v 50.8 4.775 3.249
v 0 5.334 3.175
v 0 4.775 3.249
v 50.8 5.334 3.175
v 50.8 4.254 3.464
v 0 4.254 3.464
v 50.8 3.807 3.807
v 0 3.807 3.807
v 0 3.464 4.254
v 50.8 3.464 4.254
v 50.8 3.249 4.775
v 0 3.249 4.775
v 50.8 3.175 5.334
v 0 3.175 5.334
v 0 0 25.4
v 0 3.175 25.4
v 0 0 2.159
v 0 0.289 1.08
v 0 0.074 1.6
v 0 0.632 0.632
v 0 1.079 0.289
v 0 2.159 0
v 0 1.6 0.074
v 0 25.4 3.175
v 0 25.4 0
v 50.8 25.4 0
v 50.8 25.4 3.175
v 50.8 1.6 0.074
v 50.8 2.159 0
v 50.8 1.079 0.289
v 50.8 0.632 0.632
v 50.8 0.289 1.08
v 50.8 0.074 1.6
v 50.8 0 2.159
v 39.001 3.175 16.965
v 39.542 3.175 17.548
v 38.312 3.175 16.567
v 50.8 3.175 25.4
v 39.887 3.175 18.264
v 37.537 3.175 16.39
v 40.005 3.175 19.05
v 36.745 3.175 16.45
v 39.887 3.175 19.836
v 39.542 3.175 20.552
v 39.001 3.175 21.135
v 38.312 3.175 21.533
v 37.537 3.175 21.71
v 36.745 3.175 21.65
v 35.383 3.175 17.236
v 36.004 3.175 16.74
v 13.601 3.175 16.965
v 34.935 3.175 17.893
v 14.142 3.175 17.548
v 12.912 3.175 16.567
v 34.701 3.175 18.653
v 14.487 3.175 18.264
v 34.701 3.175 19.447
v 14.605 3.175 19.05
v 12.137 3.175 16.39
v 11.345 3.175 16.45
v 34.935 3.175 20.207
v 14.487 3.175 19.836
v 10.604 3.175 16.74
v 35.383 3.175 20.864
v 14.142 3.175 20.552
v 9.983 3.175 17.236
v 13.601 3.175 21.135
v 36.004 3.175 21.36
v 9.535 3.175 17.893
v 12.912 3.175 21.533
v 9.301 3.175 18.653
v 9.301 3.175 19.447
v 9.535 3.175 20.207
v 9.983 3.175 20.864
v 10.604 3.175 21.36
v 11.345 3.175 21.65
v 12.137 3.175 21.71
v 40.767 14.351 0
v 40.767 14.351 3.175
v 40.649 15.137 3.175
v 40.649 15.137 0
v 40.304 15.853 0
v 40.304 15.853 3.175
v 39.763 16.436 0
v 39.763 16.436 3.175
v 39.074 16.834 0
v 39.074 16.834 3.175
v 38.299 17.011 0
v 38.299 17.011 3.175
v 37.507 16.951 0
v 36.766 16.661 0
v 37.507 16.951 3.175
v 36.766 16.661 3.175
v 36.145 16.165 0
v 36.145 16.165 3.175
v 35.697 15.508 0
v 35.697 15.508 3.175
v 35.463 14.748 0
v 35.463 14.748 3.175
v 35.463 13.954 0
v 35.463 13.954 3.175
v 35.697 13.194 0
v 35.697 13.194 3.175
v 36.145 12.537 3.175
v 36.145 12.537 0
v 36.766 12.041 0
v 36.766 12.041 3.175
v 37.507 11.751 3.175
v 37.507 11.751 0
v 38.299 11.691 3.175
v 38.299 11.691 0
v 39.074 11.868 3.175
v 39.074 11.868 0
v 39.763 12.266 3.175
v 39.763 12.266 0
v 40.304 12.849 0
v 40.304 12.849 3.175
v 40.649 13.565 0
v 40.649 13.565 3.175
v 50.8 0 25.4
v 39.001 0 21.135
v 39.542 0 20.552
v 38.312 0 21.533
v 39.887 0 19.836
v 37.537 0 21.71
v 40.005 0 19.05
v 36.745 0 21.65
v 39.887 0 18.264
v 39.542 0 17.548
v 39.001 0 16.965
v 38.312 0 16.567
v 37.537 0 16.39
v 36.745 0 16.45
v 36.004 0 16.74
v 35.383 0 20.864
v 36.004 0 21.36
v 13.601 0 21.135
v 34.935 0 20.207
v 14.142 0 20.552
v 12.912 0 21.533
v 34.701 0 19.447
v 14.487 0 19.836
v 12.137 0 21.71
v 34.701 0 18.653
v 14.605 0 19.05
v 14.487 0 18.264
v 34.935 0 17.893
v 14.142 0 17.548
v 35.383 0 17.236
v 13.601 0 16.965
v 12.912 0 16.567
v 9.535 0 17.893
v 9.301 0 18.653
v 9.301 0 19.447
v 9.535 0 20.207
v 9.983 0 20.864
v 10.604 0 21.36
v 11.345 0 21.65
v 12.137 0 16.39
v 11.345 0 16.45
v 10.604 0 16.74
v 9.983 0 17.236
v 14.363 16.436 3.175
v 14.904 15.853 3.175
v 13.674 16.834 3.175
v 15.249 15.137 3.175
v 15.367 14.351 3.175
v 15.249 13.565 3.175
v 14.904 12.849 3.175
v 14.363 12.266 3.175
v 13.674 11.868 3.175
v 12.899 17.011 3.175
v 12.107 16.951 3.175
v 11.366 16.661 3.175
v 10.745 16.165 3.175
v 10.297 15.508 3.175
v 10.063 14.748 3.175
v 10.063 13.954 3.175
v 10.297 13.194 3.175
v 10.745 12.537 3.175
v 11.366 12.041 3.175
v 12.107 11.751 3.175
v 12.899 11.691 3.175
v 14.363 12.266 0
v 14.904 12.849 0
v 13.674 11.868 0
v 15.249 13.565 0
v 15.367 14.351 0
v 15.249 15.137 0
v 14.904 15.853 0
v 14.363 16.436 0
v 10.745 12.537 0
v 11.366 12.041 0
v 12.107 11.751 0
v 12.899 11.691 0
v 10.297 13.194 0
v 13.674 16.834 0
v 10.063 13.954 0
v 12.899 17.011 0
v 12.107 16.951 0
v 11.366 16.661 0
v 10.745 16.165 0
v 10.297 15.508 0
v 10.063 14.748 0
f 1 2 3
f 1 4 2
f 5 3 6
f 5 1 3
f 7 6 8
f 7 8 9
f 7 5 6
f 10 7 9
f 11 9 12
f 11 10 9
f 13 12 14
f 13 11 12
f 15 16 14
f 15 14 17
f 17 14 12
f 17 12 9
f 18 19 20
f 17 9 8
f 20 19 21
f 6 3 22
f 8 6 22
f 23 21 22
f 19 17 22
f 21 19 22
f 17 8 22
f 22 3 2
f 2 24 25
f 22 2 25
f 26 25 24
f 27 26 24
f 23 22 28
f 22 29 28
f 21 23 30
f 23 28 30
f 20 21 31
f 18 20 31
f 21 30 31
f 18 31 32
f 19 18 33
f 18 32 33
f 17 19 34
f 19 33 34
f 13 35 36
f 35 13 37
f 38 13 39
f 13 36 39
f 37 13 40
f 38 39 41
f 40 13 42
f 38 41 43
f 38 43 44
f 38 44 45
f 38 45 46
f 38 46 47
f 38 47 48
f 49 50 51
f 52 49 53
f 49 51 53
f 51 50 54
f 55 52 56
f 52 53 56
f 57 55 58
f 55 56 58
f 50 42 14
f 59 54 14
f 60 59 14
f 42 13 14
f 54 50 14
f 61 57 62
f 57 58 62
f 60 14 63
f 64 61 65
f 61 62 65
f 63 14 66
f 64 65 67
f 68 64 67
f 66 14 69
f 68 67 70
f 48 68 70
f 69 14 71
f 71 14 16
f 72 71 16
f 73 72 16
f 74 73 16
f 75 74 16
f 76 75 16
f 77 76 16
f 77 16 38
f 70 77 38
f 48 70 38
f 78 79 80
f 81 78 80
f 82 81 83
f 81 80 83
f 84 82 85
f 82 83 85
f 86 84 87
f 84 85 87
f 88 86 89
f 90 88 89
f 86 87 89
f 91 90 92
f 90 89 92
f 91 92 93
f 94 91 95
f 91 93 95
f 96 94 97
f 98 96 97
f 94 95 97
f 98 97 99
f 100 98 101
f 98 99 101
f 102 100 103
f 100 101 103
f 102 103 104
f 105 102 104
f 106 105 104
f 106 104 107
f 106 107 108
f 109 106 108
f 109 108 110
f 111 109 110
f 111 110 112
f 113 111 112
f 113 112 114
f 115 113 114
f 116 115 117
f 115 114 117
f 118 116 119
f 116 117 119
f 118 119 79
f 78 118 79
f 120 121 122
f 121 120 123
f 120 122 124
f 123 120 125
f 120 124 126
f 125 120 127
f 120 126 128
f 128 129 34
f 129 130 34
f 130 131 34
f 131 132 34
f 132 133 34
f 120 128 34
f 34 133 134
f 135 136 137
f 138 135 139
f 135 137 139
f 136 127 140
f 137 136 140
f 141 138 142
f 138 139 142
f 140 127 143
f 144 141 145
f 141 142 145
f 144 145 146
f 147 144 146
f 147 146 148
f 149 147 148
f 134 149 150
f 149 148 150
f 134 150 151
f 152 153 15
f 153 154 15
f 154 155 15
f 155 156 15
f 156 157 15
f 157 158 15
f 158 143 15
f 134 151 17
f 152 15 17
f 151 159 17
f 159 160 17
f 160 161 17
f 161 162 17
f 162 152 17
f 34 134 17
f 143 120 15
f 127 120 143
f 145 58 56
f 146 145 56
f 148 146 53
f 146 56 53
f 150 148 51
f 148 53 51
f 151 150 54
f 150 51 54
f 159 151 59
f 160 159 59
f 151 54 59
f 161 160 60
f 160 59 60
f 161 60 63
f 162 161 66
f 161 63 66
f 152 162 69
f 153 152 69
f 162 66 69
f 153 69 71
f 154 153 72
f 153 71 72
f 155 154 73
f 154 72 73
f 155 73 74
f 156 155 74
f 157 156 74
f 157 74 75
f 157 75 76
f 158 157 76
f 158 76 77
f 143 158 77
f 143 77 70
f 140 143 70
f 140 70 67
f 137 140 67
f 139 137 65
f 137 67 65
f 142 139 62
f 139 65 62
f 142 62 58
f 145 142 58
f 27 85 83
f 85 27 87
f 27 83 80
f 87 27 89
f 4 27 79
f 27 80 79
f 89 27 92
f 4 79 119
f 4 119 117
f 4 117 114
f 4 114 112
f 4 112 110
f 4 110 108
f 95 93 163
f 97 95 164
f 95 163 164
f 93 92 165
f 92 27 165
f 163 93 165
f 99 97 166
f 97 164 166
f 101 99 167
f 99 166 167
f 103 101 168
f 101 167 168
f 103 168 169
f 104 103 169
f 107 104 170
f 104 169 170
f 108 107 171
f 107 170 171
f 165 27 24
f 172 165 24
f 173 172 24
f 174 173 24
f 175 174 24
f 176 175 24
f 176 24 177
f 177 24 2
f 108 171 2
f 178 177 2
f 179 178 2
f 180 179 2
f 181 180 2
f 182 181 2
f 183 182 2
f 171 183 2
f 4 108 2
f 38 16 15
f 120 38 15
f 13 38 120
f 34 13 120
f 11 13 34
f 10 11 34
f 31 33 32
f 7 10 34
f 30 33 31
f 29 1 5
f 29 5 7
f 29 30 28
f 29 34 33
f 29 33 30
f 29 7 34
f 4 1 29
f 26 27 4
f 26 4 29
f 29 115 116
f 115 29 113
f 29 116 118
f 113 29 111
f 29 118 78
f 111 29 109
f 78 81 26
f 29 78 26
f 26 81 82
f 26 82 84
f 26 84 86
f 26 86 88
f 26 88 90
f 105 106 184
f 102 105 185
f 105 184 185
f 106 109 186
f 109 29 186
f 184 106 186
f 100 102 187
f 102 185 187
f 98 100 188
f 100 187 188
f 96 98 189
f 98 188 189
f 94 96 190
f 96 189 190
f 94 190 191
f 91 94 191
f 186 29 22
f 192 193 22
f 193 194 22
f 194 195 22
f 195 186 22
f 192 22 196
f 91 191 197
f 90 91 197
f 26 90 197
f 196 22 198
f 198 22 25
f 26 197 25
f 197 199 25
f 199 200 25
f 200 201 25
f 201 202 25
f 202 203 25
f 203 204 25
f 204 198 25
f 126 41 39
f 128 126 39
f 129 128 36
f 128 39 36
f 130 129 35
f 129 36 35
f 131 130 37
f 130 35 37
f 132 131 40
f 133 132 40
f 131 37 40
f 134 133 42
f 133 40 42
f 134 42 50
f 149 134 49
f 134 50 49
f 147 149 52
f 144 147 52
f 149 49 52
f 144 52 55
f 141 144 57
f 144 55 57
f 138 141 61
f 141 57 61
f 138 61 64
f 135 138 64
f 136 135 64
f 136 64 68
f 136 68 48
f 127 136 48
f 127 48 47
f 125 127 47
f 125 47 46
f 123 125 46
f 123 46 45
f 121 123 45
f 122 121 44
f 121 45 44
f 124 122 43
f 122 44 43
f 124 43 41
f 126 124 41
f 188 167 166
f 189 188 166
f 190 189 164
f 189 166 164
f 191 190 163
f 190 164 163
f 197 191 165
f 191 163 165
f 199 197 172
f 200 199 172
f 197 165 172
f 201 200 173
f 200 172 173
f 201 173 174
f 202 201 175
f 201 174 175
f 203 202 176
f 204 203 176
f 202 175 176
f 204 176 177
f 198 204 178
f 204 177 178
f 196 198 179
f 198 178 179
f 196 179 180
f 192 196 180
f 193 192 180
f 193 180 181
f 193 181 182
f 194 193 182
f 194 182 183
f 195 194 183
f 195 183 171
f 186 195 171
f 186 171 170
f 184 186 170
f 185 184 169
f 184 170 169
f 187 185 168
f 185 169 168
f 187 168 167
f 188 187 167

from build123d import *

# Parameters (mm, degrees)
BOSS_EXTRUDE1_DEPTH = 50.8
SKETCH2_R           = 2.667
CUT_EXTRUDE1_DEPTH  = 3.175
SKETCH3_R           = 2.667
CUT_EXTRUDE2_DEPTH  = 3.175
FILLET1_R           = 2.159


with BuildPart() as part:
    # Sketch1 → Boss-Extrude1 (new body)
    with BuildSketch(Plane(origin=(0, 0, 0), x_dir=(0, 0, -1), z_dir=(1, 0, 0))):
        Polygon((0, 0), (0, 25.4), (-3.175, 25.4), (-3.175, 3.175), (-25.4, 3.175), (-25.4, 0), align=None)
    extrude(amount=BOSS_EXTRUDE1_DEPTH)

    # Sketch2 → Cut-Extrude1 (cut)
    with BuildSketch(Plane(origin=(0, 3.175, 0), x_dir=(1, 0, 0), z_dir=(0, 1, 0))):
        with Locations((11.938, -19.05)):
            Circle(SKETCH2_R)
        with Locations((37.338, -19.05)):
            Circle(SKETCH2_R)
    extrude(amount=-CUT_EXTRUDE1_DEPTH, mode=Mode.SUBTRACT)

    # Sketch3 → Cut-Extrude2 (cut)
    with BuildSketch(Plane.XY.offset(3.175)):
        with Locations((38.1, 14.351)):
            Circle(SKETCH3_R)
        with Locations((12.7, 14.351)):
            Circle(SKETCH3_R)
    extrude(amount=-CUT_EXTRUDE2_DEPTH, mode=Mode.SUBTRACT)

    # Fillet1
    fillet1_edges = [part.edges().sort_by_distance(p)[0] for p in [
        (25.4, 3.175, 3.175),
        (25.4, 0, 0),
    ]]
    fillet(fillet1_edges, radius=FILLET1_R)


solid = part.part
